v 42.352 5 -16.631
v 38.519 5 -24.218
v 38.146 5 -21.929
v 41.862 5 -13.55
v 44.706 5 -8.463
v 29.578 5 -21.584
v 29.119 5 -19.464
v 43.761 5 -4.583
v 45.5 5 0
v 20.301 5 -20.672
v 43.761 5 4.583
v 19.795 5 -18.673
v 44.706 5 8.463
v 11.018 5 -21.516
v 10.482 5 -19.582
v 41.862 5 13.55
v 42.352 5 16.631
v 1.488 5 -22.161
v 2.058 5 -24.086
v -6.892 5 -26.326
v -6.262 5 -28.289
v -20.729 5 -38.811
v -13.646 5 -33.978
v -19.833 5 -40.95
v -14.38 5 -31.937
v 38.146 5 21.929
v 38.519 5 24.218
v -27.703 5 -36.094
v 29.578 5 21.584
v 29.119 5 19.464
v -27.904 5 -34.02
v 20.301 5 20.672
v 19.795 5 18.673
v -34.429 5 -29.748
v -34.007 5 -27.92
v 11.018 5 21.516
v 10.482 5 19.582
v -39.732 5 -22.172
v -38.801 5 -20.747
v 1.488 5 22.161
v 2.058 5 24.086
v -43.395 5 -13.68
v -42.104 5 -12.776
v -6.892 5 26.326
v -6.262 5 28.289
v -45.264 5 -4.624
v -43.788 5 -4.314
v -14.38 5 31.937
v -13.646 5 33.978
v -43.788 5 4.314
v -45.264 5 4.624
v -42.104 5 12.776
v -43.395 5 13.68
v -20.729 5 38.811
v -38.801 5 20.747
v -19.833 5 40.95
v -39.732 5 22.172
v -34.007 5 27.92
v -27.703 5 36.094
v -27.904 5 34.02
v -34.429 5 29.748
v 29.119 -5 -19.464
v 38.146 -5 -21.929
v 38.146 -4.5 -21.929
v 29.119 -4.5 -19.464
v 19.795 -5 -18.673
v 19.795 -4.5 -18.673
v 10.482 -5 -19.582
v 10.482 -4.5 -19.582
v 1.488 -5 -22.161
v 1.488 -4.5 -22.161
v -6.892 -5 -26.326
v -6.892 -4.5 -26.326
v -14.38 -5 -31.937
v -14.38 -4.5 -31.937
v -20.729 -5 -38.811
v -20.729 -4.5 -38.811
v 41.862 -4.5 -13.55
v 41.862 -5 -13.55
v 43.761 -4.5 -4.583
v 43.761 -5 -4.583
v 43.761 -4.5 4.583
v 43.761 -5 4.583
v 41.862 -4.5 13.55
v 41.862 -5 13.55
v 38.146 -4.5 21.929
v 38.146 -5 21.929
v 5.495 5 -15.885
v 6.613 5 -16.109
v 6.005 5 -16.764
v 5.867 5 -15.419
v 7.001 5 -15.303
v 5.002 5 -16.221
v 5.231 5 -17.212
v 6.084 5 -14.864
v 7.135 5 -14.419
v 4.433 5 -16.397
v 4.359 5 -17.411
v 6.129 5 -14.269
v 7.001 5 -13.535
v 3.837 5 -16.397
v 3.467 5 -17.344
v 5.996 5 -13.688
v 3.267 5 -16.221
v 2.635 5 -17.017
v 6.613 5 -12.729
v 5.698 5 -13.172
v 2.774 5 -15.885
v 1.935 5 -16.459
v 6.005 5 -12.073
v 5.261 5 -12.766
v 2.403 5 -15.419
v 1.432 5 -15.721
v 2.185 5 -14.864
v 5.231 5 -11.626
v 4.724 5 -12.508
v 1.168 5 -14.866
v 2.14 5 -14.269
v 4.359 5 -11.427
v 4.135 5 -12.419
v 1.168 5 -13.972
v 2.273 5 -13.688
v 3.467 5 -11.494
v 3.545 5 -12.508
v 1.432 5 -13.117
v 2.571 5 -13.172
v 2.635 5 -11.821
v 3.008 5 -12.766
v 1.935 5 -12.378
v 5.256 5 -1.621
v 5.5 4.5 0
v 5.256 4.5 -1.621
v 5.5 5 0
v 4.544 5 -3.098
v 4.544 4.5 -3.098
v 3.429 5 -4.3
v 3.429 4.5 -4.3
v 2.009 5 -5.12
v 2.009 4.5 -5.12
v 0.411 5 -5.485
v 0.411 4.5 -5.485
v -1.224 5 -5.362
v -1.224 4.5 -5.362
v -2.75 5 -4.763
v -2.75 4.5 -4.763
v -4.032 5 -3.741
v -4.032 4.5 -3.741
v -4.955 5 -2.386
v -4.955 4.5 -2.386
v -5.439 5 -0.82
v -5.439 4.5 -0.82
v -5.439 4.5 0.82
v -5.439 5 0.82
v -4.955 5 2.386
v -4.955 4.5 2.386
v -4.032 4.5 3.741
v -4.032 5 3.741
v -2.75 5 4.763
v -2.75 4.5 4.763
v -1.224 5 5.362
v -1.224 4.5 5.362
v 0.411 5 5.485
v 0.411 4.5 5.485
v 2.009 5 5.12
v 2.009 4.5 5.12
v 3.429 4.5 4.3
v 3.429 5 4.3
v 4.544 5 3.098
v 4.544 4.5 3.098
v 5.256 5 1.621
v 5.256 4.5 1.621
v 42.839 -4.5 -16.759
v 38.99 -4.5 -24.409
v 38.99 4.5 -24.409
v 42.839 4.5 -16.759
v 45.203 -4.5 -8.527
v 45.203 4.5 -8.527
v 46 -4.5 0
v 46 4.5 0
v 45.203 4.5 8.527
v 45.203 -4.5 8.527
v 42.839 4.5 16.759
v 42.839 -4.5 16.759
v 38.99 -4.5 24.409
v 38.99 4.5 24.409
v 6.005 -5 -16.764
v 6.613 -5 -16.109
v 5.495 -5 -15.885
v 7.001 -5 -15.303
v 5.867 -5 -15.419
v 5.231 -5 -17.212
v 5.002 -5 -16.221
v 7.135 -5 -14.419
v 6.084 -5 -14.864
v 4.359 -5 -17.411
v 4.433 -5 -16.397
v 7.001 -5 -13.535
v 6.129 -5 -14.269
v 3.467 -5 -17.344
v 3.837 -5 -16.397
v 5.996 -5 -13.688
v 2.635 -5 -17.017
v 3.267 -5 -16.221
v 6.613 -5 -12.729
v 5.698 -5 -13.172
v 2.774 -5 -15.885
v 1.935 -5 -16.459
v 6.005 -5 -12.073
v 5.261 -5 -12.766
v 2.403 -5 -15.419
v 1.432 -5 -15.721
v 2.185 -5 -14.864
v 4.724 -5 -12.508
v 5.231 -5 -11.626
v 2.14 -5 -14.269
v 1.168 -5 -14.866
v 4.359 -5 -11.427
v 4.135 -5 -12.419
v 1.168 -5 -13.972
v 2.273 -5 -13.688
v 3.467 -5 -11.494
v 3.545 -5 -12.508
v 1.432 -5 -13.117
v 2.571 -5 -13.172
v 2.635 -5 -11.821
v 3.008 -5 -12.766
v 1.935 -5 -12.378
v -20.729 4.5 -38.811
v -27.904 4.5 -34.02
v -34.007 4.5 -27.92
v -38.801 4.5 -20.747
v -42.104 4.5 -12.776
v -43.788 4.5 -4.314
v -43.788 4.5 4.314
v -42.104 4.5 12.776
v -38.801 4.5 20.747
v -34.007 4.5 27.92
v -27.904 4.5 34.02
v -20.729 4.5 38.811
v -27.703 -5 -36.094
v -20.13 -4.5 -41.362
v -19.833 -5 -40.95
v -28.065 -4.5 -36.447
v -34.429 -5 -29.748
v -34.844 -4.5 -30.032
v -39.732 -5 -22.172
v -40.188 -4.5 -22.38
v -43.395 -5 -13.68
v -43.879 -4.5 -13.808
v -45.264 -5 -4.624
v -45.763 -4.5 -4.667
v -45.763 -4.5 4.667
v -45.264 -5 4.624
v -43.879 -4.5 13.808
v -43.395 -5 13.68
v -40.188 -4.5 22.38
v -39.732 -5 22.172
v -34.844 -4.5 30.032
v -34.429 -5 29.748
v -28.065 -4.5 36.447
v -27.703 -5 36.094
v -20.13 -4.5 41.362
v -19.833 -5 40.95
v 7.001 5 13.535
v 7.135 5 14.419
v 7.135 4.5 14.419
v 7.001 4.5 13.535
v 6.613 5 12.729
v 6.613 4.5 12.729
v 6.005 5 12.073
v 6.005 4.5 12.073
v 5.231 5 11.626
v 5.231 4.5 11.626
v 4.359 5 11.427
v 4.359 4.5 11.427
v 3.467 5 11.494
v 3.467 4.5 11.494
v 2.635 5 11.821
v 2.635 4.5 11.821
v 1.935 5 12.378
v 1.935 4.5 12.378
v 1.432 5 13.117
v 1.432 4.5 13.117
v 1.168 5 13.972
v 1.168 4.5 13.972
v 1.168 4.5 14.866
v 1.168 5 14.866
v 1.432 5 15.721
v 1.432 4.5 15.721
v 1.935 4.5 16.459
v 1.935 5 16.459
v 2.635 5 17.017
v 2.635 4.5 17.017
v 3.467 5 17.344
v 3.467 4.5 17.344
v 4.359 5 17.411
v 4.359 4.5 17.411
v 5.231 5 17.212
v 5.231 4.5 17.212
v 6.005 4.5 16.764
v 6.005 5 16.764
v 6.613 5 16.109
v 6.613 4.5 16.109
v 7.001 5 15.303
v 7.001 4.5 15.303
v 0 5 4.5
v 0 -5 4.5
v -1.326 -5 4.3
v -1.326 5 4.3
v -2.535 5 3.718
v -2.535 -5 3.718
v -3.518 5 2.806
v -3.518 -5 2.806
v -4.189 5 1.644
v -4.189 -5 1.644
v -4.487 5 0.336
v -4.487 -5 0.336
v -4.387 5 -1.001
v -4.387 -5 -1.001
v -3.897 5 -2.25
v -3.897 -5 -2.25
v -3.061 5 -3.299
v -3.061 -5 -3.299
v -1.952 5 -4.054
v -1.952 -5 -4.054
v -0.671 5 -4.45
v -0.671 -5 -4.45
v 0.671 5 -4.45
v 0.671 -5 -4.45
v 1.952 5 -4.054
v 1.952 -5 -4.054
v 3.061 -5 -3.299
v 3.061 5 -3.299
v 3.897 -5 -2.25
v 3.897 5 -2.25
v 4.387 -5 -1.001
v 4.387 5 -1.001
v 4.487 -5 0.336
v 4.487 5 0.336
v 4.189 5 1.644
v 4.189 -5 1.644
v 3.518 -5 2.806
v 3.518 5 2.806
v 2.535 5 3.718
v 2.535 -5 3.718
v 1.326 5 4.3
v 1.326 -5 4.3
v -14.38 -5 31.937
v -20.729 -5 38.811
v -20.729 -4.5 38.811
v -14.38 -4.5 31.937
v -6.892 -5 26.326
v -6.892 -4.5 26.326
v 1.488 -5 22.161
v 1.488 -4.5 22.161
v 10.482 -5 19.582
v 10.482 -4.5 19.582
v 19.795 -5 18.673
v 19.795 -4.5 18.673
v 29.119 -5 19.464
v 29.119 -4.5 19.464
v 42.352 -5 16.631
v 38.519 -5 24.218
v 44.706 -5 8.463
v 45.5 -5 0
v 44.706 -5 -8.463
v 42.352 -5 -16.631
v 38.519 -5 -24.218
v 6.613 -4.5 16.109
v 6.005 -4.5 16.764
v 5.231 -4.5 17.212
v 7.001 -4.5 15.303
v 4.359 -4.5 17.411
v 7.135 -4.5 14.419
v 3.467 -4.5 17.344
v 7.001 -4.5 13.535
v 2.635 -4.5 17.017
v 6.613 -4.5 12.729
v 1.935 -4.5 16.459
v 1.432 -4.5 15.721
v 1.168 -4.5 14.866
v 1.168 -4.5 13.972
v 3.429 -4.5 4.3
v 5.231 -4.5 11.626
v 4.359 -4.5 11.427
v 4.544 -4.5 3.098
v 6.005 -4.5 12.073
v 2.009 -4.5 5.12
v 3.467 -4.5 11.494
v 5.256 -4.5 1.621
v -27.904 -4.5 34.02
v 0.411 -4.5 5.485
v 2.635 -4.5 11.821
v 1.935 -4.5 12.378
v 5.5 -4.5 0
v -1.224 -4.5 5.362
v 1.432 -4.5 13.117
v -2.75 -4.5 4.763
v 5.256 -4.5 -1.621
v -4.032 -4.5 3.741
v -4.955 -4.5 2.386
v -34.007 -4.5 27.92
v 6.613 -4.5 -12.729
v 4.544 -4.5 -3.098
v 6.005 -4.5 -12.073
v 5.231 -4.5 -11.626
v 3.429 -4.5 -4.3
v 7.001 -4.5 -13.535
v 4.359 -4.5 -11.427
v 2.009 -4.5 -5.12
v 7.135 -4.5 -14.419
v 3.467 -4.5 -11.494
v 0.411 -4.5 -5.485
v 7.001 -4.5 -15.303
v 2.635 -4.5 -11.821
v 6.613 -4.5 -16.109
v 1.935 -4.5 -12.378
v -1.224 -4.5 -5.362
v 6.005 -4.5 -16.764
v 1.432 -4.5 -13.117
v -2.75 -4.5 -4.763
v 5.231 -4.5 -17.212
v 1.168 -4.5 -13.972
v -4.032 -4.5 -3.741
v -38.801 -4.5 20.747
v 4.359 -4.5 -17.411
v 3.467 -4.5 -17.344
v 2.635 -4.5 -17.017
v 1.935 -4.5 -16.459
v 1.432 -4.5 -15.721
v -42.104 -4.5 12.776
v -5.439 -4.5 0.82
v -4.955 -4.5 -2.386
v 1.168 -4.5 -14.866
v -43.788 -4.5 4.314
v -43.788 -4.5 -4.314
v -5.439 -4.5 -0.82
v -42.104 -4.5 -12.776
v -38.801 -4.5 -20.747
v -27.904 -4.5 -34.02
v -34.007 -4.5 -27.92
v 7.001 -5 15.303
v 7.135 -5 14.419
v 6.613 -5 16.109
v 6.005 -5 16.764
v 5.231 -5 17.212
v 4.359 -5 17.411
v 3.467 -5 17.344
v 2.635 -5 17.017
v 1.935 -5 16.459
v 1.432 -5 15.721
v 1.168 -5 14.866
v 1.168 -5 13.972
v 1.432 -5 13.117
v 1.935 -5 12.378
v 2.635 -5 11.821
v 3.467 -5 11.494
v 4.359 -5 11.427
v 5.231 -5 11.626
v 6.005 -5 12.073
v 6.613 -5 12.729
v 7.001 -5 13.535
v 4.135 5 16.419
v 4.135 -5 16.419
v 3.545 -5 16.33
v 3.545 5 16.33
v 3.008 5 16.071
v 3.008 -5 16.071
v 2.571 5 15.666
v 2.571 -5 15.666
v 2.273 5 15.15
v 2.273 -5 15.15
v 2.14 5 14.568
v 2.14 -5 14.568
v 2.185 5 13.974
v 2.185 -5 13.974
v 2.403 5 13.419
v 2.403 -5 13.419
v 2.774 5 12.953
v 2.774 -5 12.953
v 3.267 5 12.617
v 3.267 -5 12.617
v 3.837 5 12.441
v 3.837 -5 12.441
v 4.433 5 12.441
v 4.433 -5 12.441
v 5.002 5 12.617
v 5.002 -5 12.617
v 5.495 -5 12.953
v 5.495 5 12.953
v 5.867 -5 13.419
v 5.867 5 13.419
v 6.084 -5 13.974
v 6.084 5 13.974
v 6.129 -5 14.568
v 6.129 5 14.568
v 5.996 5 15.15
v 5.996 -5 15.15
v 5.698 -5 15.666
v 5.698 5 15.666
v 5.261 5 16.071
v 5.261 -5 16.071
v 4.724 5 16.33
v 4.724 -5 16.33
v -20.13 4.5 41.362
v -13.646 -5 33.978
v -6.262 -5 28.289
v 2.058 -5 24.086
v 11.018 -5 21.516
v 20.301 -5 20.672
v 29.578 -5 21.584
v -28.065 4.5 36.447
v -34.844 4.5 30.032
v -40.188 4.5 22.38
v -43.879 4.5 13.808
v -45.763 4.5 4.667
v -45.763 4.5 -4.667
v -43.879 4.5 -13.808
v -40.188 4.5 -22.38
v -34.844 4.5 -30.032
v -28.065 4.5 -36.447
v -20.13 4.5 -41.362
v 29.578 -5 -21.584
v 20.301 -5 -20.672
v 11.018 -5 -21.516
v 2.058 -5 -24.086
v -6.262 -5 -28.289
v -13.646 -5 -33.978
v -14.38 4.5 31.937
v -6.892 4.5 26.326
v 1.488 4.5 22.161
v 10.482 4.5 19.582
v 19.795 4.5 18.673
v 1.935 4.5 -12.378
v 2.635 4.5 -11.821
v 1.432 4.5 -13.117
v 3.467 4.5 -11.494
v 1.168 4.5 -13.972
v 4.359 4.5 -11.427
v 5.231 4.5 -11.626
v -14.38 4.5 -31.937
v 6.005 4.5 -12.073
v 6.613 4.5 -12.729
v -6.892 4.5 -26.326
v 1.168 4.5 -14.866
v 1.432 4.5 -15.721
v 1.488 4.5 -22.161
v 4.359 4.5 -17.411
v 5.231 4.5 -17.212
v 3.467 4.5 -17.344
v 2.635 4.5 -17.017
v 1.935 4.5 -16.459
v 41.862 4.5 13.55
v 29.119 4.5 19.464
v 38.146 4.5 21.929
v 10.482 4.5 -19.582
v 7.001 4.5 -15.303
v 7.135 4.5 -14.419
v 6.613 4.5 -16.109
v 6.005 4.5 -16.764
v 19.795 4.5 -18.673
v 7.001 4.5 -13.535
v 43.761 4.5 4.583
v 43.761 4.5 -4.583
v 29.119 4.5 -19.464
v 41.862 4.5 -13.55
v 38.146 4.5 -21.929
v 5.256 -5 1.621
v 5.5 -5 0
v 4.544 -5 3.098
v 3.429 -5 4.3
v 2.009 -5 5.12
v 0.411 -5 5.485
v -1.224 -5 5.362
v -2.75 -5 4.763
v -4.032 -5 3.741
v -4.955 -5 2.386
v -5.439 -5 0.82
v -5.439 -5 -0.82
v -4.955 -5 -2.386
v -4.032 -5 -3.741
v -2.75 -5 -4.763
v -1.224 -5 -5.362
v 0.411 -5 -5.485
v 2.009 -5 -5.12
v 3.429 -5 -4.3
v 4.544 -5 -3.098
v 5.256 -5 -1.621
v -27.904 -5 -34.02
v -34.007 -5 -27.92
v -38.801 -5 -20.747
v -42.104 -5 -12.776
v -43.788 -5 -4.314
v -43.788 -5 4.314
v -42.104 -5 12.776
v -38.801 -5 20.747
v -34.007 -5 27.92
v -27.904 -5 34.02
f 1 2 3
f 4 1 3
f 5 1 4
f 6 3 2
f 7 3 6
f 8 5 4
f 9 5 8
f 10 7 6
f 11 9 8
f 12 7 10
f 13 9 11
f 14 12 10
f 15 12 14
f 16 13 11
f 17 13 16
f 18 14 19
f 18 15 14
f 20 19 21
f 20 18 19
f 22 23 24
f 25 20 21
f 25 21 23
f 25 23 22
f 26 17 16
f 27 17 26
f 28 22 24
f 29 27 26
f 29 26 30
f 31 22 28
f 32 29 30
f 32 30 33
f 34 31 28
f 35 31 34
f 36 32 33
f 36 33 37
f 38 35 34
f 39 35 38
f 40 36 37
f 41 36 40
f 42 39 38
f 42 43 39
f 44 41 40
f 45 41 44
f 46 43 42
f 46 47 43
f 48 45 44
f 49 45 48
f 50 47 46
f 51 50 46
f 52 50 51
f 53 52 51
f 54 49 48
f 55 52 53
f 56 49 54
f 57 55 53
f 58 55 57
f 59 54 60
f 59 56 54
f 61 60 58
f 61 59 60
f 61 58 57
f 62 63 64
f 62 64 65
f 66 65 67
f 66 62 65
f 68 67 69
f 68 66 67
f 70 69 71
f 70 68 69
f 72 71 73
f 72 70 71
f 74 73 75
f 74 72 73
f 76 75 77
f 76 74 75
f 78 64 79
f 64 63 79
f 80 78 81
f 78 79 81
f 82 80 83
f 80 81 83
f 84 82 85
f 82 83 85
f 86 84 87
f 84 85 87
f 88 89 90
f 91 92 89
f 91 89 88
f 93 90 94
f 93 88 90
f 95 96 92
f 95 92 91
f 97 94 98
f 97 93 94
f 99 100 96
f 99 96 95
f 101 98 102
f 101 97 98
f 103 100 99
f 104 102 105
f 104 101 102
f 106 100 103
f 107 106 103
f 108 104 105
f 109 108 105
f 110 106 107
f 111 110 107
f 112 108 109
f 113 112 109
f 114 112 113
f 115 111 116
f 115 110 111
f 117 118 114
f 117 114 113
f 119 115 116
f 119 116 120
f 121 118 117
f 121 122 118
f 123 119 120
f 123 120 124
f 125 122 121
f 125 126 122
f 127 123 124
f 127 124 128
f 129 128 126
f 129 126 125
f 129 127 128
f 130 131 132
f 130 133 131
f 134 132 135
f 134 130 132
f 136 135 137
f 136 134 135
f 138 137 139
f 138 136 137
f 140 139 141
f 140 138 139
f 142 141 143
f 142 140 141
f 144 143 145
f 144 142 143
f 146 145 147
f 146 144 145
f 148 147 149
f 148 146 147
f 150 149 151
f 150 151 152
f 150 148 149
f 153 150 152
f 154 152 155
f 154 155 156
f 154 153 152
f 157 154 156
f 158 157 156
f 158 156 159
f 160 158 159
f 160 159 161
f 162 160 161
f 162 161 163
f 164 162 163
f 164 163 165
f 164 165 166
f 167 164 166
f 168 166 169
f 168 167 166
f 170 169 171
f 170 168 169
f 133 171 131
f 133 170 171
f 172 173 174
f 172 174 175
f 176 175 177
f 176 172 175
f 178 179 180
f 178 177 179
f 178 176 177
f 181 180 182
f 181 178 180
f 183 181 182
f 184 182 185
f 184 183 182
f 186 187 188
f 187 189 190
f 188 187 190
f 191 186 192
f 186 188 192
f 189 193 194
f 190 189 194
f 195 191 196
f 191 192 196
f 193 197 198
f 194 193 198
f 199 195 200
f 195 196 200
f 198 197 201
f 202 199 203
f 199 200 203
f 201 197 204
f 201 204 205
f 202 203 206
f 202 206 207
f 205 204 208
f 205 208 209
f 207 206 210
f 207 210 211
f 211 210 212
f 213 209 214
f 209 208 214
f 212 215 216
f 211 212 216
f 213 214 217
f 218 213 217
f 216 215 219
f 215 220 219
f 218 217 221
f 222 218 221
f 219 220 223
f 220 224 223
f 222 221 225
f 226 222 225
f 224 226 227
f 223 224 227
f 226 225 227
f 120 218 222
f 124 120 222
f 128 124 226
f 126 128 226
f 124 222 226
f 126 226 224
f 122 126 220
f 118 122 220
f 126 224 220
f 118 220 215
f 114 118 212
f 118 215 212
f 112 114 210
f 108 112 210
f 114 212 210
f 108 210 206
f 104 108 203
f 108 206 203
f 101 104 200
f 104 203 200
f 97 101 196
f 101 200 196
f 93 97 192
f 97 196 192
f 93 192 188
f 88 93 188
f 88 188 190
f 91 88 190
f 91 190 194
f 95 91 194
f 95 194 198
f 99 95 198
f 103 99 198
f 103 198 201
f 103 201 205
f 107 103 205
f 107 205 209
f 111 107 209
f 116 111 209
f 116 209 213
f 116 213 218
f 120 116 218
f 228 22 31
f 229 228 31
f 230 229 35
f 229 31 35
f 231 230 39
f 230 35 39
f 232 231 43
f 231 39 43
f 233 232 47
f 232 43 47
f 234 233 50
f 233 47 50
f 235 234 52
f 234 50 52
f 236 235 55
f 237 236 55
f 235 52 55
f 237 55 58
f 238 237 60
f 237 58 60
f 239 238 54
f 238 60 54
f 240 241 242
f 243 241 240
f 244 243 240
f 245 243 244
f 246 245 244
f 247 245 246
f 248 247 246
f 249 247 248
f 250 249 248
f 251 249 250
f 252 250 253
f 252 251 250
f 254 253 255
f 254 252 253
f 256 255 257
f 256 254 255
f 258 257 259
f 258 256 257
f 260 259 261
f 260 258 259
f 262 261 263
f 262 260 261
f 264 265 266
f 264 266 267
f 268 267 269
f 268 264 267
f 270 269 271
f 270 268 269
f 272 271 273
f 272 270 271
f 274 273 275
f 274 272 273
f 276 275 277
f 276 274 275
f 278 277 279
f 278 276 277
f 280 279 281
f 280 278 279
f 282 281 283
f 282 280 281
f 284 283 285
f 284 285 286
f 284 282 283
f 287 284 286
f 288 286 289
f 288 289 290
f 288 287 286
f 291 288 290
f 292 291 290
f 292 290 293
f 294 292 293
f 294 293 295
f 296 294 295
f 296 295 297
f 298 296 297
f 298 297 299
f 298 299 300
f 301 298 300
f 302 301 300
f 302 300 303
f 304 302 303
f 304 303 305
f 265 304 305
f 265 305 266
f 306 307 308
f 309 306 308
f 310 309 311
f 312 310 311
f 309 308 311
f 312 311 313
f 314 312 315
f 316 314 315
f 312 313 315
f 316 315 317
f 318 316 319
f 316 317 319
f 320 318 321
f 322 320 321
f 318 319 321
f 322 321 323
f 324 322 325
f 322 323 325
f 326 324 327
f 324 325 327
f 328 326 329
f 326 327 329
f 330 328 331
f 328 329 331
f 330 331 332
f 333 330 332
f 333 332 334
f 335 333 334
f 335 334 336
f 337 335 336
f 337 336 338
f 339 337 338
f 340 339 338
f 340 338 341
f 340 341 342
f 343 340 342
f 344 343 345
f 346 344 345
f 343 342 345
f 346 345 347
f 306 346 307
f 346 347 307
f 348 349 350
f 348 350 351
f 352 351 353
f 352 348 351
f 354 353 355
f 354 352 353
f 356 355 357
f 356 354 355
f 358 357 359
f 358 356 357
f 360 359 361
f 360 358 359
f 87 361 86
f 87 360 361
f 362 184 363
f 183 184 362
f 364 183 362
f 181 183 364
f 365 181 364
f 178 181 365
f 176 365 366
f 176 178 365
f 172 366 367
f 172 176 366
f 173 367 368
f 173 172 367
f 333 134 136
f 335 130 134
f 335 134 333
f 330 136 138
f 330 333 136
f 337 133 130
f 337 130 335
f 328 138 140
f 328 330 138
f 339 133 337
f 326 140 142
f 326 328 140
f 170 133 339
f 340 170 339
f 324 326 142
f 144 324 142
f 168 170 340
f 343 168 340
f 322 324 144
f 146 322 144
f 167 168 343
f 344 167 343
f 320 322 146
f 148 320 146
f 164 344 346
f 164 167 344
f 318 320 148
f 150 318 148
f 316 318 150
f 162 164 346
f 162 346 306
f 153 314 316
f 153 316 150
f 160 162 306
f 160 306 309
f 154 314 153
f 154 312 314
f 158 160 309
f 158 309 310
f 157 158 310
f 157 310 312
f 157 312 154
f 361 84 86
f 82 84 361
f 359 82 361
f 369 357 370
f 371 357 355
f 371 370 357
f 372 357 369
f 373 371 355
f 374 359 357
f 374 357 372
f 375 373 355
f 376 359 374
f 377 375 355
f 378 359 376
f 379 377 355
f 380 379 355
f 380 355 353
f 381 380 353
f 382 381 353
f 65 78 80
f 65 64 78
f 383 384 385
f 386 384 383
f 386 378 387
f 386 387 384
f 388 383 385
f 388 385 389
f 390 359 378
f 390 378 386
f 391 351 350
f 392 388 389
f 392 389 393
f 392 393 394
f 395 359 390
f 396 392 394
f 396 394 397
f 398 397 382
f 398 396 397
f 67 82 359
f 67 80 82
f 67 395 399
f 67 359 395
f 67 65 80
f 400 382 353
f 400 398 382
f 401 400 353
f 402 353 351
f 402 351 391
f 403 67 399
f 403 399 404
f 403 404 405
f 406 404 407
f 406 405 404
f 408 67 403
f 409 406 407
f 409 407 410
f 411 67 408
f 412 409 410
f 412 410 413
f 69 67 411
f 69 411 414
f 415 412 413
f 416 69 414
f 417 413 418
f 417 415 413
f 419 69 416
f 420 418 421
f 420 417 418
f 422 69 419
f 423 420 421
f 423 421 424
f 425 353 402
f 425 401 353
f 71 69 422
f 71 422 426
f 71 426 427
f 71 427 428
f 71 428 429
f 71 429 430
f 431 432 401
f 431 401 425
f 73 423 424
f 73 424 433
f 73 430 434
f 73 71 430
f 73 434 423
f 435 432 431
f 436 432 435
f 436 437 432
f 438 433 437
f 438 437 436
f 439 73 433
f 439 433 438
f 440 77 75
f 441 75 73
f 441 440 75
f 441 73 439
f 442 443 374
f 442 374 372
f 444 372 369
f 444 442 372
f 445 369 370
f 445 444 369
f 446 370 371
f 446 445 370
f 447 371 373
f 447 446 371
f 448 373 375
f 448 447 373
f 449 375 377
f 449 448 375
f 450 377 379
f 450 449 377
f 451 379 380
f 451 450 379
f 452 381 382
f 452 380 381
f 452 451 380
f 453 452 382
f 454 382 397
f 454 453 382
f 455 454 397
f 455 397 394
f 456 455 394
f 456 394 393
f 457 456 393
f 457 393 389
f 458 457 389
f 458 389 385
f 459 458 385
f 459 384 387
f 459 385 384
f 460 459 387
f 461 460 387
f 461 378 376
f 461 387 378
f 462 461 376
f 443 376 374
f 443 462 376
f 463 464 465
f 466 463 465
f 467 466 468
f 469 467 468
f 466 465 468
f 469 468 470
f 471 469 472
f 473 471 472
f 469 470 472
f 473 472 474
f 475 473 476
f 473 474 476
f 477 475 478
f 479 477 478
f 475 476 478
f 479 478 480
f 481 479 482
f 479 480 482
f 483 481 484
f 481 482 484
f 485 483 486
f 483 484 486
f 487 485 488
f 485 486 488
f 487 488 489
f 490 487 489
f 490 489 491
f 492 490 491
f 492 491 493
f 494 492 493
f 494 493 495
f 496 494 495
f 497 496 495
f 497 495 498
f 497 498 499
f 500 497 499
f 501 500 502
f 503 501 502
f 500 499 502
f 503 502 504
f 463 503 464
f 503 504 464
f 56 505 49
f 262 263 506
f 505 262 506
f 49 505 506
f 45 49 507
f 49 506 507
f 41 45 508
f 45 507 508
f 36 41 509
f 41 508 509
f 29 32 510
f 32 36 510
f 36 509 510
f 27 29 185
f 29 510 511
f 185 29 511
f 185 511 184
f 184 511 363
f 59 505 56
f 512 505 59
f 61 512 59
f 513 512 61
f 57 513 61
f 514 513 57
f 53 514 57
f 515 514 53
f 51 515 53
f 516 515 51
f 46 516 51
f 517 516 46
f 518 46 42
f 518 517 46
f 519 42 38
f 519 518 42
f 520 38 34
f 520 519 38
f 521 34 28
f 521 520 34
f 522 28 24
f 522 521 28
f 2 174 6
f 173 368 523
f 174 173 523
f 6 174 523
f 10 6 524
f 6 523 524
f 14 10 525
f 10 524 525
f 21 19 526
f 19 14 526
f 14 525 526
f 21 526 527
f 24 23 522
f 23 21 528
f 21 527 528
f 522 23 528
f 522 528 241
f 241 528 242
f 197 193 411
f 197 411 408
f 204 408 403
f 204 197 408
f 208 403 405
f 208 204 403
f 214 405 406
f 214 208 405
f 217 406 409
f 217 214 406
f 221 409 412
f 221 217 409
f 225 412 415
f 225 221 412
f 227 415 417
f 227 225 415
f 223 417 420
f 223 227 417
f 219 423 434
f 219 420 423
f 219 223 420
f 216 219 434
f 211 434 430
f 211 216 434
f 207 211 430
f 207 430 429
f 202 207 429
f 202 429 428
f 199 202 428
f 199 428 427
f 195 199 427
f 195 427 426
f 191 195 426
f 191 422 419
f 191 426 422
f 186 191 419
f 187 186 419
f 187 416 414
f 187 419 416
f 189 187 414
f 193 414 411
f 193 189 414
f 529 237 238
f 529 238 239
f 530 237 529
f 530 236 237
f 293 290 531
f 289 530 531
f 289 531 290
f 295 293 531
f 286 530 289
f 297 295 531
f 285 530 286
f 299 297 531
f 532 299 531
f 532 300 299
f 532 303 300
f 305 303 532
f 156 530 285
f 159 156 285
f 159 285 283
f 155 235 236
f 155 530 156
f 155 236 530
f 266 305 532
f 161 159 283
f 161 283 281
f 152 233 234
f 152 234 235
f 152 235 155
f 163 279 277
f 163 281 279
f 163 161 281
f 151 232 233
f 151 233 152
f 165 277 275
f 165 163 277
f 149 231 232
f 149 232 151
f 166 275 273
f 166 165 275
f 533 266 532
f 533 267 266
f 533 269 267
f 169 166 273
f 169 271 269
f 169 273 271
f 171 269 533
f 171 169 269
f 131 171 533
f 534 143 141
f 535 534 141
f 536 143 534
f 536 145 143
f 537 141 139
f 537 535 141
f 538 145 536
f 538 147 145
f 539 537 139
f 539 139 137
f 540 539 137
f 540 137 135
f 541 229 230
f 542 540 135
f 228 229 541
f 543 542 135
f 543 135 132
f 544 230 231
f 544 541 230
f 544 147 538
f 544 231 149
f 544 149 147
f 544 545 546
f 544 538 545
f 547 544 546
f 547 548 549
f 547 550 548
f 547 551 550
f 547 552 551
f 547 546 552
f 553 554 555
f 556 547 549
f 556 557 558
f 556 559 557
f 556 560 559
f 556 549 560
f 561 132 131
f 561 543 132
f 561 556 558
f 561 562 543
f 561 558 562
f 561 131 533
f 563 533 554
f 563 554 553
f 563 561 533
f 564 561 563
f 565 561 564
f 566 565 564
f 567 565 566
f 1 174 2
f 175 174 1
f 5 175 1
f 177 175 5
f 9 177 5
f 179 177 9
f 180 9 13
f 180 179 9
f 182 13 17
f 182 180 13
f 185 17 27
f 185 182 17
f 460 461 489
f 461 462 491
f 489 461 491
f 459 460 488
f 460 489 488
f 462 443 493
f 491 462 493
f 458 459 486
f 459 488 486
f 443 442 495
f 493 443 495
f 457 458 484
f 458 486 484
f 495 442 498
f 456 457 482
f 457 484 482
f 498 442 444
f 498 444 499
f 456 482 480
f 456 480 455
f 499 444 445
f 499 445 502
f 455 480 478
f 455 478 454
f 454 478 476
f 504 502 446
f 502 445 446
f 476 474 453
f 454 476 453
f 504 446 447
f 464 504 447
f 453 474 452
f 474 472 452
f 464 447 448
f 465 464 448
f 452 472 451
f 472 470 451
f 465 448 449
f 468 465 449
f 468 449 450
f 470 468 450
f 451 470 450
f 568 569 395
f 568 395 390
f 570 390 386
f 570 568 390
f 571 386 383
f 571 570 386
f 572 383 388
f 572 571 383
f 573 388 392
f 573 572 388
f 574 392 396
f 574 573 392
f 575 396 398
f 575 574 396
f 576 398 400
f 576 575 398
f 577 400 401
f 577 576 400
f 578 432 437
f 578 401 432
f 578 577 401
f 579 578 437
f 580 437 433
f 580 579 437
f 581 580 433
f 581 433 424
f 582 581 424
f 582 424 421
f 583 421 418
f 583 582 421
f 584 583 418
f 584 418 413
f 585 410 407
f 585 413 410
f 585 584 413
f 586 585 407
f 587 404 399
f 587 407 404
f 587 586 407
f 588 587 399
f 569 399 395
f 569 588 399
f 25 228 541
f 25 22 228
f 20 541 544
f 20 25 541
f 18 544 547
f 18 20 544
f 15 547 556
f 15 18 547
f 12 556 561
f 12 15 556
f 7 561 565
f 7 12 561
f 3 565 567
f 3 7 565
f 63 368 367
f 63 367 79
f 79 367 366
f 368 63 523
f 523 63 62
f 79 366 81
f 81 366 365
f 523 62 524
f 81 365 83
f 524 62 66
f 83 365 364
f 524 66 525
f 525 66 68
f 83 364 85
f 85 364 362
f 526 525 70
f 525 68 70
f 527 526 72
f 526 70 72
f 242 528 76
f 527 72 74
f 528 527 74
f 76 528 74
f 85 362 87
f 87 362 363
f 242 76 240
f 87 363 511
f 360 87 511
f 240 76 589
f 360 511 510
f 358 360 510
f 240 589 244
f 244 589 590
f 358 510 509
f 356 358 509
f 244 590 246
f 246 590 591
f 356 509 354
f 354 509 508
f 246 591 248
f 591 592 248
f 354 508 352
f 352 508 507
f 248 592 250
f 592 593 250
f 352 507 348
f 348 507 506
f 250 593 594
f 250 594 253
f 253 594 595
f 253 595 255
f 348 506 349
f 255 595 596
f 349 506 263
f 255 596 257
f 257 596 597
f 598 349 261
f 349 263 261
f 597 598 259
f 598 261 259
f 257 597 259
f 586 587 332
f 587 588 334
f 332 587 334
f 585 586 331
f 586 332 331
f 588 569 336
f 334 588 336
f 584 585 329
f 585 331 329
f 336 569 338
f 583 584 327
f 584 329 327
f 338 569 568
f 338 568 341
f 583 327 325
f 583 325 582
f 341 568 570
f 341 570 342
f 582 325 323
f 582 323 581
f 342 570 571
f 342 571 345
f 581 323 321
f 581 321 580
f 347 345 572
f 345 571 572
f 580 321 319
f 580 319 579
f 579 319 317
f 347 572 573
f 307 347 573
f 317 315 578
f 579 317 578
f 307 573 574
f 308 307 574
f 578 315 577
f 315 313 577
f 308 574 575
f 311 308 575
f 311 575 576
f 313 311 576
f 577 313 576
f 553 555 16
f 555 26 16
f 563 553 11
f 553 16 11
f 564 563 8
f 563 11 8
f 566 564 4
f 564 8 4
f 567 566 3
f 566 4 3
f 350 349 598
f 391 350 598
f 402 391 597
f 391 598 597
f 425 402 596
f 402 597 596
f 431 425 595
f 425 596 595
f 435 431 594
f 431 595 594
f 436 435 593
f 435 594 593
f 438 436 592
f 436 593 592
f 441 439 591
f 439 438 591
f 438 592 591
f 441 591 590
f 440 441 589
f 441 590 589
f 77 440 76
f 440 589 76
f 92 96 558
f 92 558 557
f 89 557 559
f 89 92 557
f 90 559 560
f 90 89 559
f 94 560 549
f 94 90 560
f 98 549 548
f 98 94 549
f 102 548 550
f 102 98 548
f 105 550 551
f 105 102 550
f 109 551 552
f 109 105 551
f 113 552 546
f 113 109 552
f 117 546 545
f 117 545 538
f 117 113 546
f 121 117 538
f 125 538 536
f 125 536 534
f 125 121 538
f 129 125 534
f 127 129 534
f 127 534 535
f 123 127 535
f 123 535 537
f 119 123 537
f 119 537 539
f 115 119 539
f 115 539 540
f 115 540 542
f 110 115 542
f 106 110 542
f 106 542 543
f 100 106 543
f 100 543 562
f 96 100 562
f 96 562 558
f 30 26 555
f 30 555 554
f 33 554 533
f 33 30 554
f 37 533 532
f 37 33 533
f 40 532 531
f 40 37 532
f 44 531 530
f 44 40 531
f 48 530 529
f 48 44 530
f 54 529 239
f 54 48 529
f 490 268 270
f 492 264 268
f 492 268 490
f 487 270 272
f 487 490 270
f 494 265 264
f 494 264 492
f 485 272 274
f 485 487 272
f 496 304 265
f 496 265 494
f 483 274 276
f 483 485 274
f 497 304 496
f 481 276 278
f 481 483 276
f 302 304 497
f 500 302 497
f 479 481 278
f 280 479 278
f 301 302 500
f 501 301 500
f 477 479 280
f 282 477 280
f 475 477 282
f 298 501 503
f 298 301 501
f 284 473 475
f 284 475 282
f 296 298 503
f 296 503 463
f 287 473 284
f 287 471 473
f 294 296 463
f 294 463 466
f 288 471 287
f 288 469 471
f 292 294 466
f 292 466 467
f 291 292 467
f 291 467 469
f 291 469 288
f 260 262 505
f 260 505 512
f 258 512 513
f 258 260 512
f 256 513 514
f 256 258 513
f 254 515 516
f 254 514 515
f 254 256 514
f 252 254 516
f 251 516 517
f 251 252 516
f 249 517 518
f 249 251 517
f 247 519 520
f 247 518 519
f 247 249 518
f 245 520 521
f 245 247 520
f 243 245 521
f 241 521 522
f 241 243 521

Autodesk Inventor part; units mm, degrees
ref_plane "YZ Plane" through (0, 0, 0) normal (1, 0, 0) x (0, 1, 0)
ref_plane "XZ Plane" through (0, 0, 0) normal (0, 1, 0) x (-1, 0, 0)
ref_plane "XY Plane" through (0, 0, 0) normal (0, 0, 1) x (1, 0, 0)
sketch "Sketch1" plane through (0, 0, 0) normal (0, 1, 0) x (-1, 0, 0)
  arc A0 (-38.9896, 24.4092) -> (-38.9896, -24.4092) centre (0, 0) ccw
  arc A1 (-38.9896, 24.4092) -> (20.1302, 41.3615) centre (-20.1215, 70.1721) ccw
  line L0 (0, 0) -> (-20.1215, 70.1721) construction
  line L1 (102.2, 0) -> (-102.2, 0) construction
  circle A2 centre (0, 0) radius 73 construction
  arc A3 (20.1302, -41.3615) -> (-38.9896, -24.4092) centre (-20.1215, -70.1721) ccw
  line L2 (20.1302, 41.3615) -> (20.1302, -41.3615) construction
  line L3 (-38.9896, 24.4092) -> (-38.9896, -24.4092) construction
  arc A4 (-12.6793, 44.218) -> (-38.9896, 24.4092) centre (0, 0) ccw construction
  arc A5 (20.1302, 41.3615) -> (-12.6793, 44.218) centre (0, 0) ccw construction
  arc A6 (20.1302, -41.3615) -> (20.1302, 41.3615) centre (0, 0) ccw
  arc A7 (-38.9896, -24.4092) -> (20.1302, -41.3615) centre (0, 0) ccw construction
  dimension "d3" = 146
  dimension "d0" = 92
  dimension "d1" = 49.5
  dimension "d2" = 74
extrude "Extrusion1" add sketch "Sketch1" along normal mid plane 10
sketch "Sketch6" plane through (0, 5, 0) normal (0, 1, 0) x (1, 0, 0)
  arc A0 (-20.1302, 41.3615) -> (-20.1302, -41.3615) centre (0, 0) ccw projected
  arc A1 (38.9896, -24.4092) -> (-20.1302, -41.3615) centre (20.1215, -70.1721) ccw projected
  arc A2 (38.9896, -24.4092) -> (38.9896, 24.4092) centre (0, 0) ccw projected
  arc A3 (-20.1302, 41.3615) -> (38.9896, 24.4092) centre (20.1215, 70.1721) ccw projected
  line L0 (0, 0) -> (20.1215, -70.1721) construction
  line L1 (0, 0) -> (20.1215, 70.1721) construction
  point P0 (4.1346, -14.4189)
  point P1 (4.1346, 14.4189)
  dimension "d15" = 15
hole "Hole1" at (4.1346, 5, 14.4189) at (4.1346, 5, -14.4189) direction (0, -1, 0) diameter 4 end through all
sketch "Sketch7" plane through (0, 5, 0) normal (0, 1, 0) x (1, 0, 0)
  circle A0 centre (4.1346, -14.4189) radius 2 projected
  circle A1 centre (4.1346, 14.4189) radius 2 projected
  arc A2 (-20.1302, 41.3615) -> (-20.1302, -41.3615) centre (0, 0) ccw projected
  arc A3 (38.9896, -24.4092) -> (-20.1302, -41.3615) centre (20.1215, -70.1721) ccw projected
  arc A4 (38.9896, -24.4092) -> (38.9896, 24.4092) centre (0, 0) ccw projected
  arc A5 (-20.1302, 41.3615) -> (38.9896, 24.4092) centre (20.1215, 70.1721) ccw projected
  arc A6 (-20.7288, 38.8113) -> (-20.7288, -38.8113) centre (0, 0) ccw
  arc A7 (-20.7288, 38.8113) -> (38.1459, 21.9293) centre (20.1215, 70.1721) ccw
  arc A8 (38.1459, -21.9293) -> (38.1459, 21.9293) centre (0, 0) ccw
  arc A9 (38.1459, -21.9293) -> (-20.7288, -38.8113) centre (20.1215, -70.1721) ccw
  circle A10 centre (4.1346, -14.4189) radius 3
  circle A11 centre (4.1346, 14.4189) radius 3
  circle A12 centre (0, 0) radius 5.5
  dimension "d23" = 2
  dimension "d24" = 6
  dimension "d25" = 6
  dimension "d35" = 11
extrude "Extrusion3" cut sketch "Sketch7" against normal blind 0.5 contours A7 A8 A9 A6
hole "Hole2" at (0, 5, 0) direction (0, -1, 0) diameter 9 end through all
chamfer "Chamfer2" distance 0.5 angle 45 2 edges at (-46, 5, 0) (46, 5, 0)
mirror "Mirror2" about plane through (0, 0, 0) normal (0, 1, 0) of "Extrusion3"
chamfer "Chamfer3" distance 0.5 angle 45 2 edges at (46, -5, 0) (-46, -5, 0)
properties part number "Disk"
